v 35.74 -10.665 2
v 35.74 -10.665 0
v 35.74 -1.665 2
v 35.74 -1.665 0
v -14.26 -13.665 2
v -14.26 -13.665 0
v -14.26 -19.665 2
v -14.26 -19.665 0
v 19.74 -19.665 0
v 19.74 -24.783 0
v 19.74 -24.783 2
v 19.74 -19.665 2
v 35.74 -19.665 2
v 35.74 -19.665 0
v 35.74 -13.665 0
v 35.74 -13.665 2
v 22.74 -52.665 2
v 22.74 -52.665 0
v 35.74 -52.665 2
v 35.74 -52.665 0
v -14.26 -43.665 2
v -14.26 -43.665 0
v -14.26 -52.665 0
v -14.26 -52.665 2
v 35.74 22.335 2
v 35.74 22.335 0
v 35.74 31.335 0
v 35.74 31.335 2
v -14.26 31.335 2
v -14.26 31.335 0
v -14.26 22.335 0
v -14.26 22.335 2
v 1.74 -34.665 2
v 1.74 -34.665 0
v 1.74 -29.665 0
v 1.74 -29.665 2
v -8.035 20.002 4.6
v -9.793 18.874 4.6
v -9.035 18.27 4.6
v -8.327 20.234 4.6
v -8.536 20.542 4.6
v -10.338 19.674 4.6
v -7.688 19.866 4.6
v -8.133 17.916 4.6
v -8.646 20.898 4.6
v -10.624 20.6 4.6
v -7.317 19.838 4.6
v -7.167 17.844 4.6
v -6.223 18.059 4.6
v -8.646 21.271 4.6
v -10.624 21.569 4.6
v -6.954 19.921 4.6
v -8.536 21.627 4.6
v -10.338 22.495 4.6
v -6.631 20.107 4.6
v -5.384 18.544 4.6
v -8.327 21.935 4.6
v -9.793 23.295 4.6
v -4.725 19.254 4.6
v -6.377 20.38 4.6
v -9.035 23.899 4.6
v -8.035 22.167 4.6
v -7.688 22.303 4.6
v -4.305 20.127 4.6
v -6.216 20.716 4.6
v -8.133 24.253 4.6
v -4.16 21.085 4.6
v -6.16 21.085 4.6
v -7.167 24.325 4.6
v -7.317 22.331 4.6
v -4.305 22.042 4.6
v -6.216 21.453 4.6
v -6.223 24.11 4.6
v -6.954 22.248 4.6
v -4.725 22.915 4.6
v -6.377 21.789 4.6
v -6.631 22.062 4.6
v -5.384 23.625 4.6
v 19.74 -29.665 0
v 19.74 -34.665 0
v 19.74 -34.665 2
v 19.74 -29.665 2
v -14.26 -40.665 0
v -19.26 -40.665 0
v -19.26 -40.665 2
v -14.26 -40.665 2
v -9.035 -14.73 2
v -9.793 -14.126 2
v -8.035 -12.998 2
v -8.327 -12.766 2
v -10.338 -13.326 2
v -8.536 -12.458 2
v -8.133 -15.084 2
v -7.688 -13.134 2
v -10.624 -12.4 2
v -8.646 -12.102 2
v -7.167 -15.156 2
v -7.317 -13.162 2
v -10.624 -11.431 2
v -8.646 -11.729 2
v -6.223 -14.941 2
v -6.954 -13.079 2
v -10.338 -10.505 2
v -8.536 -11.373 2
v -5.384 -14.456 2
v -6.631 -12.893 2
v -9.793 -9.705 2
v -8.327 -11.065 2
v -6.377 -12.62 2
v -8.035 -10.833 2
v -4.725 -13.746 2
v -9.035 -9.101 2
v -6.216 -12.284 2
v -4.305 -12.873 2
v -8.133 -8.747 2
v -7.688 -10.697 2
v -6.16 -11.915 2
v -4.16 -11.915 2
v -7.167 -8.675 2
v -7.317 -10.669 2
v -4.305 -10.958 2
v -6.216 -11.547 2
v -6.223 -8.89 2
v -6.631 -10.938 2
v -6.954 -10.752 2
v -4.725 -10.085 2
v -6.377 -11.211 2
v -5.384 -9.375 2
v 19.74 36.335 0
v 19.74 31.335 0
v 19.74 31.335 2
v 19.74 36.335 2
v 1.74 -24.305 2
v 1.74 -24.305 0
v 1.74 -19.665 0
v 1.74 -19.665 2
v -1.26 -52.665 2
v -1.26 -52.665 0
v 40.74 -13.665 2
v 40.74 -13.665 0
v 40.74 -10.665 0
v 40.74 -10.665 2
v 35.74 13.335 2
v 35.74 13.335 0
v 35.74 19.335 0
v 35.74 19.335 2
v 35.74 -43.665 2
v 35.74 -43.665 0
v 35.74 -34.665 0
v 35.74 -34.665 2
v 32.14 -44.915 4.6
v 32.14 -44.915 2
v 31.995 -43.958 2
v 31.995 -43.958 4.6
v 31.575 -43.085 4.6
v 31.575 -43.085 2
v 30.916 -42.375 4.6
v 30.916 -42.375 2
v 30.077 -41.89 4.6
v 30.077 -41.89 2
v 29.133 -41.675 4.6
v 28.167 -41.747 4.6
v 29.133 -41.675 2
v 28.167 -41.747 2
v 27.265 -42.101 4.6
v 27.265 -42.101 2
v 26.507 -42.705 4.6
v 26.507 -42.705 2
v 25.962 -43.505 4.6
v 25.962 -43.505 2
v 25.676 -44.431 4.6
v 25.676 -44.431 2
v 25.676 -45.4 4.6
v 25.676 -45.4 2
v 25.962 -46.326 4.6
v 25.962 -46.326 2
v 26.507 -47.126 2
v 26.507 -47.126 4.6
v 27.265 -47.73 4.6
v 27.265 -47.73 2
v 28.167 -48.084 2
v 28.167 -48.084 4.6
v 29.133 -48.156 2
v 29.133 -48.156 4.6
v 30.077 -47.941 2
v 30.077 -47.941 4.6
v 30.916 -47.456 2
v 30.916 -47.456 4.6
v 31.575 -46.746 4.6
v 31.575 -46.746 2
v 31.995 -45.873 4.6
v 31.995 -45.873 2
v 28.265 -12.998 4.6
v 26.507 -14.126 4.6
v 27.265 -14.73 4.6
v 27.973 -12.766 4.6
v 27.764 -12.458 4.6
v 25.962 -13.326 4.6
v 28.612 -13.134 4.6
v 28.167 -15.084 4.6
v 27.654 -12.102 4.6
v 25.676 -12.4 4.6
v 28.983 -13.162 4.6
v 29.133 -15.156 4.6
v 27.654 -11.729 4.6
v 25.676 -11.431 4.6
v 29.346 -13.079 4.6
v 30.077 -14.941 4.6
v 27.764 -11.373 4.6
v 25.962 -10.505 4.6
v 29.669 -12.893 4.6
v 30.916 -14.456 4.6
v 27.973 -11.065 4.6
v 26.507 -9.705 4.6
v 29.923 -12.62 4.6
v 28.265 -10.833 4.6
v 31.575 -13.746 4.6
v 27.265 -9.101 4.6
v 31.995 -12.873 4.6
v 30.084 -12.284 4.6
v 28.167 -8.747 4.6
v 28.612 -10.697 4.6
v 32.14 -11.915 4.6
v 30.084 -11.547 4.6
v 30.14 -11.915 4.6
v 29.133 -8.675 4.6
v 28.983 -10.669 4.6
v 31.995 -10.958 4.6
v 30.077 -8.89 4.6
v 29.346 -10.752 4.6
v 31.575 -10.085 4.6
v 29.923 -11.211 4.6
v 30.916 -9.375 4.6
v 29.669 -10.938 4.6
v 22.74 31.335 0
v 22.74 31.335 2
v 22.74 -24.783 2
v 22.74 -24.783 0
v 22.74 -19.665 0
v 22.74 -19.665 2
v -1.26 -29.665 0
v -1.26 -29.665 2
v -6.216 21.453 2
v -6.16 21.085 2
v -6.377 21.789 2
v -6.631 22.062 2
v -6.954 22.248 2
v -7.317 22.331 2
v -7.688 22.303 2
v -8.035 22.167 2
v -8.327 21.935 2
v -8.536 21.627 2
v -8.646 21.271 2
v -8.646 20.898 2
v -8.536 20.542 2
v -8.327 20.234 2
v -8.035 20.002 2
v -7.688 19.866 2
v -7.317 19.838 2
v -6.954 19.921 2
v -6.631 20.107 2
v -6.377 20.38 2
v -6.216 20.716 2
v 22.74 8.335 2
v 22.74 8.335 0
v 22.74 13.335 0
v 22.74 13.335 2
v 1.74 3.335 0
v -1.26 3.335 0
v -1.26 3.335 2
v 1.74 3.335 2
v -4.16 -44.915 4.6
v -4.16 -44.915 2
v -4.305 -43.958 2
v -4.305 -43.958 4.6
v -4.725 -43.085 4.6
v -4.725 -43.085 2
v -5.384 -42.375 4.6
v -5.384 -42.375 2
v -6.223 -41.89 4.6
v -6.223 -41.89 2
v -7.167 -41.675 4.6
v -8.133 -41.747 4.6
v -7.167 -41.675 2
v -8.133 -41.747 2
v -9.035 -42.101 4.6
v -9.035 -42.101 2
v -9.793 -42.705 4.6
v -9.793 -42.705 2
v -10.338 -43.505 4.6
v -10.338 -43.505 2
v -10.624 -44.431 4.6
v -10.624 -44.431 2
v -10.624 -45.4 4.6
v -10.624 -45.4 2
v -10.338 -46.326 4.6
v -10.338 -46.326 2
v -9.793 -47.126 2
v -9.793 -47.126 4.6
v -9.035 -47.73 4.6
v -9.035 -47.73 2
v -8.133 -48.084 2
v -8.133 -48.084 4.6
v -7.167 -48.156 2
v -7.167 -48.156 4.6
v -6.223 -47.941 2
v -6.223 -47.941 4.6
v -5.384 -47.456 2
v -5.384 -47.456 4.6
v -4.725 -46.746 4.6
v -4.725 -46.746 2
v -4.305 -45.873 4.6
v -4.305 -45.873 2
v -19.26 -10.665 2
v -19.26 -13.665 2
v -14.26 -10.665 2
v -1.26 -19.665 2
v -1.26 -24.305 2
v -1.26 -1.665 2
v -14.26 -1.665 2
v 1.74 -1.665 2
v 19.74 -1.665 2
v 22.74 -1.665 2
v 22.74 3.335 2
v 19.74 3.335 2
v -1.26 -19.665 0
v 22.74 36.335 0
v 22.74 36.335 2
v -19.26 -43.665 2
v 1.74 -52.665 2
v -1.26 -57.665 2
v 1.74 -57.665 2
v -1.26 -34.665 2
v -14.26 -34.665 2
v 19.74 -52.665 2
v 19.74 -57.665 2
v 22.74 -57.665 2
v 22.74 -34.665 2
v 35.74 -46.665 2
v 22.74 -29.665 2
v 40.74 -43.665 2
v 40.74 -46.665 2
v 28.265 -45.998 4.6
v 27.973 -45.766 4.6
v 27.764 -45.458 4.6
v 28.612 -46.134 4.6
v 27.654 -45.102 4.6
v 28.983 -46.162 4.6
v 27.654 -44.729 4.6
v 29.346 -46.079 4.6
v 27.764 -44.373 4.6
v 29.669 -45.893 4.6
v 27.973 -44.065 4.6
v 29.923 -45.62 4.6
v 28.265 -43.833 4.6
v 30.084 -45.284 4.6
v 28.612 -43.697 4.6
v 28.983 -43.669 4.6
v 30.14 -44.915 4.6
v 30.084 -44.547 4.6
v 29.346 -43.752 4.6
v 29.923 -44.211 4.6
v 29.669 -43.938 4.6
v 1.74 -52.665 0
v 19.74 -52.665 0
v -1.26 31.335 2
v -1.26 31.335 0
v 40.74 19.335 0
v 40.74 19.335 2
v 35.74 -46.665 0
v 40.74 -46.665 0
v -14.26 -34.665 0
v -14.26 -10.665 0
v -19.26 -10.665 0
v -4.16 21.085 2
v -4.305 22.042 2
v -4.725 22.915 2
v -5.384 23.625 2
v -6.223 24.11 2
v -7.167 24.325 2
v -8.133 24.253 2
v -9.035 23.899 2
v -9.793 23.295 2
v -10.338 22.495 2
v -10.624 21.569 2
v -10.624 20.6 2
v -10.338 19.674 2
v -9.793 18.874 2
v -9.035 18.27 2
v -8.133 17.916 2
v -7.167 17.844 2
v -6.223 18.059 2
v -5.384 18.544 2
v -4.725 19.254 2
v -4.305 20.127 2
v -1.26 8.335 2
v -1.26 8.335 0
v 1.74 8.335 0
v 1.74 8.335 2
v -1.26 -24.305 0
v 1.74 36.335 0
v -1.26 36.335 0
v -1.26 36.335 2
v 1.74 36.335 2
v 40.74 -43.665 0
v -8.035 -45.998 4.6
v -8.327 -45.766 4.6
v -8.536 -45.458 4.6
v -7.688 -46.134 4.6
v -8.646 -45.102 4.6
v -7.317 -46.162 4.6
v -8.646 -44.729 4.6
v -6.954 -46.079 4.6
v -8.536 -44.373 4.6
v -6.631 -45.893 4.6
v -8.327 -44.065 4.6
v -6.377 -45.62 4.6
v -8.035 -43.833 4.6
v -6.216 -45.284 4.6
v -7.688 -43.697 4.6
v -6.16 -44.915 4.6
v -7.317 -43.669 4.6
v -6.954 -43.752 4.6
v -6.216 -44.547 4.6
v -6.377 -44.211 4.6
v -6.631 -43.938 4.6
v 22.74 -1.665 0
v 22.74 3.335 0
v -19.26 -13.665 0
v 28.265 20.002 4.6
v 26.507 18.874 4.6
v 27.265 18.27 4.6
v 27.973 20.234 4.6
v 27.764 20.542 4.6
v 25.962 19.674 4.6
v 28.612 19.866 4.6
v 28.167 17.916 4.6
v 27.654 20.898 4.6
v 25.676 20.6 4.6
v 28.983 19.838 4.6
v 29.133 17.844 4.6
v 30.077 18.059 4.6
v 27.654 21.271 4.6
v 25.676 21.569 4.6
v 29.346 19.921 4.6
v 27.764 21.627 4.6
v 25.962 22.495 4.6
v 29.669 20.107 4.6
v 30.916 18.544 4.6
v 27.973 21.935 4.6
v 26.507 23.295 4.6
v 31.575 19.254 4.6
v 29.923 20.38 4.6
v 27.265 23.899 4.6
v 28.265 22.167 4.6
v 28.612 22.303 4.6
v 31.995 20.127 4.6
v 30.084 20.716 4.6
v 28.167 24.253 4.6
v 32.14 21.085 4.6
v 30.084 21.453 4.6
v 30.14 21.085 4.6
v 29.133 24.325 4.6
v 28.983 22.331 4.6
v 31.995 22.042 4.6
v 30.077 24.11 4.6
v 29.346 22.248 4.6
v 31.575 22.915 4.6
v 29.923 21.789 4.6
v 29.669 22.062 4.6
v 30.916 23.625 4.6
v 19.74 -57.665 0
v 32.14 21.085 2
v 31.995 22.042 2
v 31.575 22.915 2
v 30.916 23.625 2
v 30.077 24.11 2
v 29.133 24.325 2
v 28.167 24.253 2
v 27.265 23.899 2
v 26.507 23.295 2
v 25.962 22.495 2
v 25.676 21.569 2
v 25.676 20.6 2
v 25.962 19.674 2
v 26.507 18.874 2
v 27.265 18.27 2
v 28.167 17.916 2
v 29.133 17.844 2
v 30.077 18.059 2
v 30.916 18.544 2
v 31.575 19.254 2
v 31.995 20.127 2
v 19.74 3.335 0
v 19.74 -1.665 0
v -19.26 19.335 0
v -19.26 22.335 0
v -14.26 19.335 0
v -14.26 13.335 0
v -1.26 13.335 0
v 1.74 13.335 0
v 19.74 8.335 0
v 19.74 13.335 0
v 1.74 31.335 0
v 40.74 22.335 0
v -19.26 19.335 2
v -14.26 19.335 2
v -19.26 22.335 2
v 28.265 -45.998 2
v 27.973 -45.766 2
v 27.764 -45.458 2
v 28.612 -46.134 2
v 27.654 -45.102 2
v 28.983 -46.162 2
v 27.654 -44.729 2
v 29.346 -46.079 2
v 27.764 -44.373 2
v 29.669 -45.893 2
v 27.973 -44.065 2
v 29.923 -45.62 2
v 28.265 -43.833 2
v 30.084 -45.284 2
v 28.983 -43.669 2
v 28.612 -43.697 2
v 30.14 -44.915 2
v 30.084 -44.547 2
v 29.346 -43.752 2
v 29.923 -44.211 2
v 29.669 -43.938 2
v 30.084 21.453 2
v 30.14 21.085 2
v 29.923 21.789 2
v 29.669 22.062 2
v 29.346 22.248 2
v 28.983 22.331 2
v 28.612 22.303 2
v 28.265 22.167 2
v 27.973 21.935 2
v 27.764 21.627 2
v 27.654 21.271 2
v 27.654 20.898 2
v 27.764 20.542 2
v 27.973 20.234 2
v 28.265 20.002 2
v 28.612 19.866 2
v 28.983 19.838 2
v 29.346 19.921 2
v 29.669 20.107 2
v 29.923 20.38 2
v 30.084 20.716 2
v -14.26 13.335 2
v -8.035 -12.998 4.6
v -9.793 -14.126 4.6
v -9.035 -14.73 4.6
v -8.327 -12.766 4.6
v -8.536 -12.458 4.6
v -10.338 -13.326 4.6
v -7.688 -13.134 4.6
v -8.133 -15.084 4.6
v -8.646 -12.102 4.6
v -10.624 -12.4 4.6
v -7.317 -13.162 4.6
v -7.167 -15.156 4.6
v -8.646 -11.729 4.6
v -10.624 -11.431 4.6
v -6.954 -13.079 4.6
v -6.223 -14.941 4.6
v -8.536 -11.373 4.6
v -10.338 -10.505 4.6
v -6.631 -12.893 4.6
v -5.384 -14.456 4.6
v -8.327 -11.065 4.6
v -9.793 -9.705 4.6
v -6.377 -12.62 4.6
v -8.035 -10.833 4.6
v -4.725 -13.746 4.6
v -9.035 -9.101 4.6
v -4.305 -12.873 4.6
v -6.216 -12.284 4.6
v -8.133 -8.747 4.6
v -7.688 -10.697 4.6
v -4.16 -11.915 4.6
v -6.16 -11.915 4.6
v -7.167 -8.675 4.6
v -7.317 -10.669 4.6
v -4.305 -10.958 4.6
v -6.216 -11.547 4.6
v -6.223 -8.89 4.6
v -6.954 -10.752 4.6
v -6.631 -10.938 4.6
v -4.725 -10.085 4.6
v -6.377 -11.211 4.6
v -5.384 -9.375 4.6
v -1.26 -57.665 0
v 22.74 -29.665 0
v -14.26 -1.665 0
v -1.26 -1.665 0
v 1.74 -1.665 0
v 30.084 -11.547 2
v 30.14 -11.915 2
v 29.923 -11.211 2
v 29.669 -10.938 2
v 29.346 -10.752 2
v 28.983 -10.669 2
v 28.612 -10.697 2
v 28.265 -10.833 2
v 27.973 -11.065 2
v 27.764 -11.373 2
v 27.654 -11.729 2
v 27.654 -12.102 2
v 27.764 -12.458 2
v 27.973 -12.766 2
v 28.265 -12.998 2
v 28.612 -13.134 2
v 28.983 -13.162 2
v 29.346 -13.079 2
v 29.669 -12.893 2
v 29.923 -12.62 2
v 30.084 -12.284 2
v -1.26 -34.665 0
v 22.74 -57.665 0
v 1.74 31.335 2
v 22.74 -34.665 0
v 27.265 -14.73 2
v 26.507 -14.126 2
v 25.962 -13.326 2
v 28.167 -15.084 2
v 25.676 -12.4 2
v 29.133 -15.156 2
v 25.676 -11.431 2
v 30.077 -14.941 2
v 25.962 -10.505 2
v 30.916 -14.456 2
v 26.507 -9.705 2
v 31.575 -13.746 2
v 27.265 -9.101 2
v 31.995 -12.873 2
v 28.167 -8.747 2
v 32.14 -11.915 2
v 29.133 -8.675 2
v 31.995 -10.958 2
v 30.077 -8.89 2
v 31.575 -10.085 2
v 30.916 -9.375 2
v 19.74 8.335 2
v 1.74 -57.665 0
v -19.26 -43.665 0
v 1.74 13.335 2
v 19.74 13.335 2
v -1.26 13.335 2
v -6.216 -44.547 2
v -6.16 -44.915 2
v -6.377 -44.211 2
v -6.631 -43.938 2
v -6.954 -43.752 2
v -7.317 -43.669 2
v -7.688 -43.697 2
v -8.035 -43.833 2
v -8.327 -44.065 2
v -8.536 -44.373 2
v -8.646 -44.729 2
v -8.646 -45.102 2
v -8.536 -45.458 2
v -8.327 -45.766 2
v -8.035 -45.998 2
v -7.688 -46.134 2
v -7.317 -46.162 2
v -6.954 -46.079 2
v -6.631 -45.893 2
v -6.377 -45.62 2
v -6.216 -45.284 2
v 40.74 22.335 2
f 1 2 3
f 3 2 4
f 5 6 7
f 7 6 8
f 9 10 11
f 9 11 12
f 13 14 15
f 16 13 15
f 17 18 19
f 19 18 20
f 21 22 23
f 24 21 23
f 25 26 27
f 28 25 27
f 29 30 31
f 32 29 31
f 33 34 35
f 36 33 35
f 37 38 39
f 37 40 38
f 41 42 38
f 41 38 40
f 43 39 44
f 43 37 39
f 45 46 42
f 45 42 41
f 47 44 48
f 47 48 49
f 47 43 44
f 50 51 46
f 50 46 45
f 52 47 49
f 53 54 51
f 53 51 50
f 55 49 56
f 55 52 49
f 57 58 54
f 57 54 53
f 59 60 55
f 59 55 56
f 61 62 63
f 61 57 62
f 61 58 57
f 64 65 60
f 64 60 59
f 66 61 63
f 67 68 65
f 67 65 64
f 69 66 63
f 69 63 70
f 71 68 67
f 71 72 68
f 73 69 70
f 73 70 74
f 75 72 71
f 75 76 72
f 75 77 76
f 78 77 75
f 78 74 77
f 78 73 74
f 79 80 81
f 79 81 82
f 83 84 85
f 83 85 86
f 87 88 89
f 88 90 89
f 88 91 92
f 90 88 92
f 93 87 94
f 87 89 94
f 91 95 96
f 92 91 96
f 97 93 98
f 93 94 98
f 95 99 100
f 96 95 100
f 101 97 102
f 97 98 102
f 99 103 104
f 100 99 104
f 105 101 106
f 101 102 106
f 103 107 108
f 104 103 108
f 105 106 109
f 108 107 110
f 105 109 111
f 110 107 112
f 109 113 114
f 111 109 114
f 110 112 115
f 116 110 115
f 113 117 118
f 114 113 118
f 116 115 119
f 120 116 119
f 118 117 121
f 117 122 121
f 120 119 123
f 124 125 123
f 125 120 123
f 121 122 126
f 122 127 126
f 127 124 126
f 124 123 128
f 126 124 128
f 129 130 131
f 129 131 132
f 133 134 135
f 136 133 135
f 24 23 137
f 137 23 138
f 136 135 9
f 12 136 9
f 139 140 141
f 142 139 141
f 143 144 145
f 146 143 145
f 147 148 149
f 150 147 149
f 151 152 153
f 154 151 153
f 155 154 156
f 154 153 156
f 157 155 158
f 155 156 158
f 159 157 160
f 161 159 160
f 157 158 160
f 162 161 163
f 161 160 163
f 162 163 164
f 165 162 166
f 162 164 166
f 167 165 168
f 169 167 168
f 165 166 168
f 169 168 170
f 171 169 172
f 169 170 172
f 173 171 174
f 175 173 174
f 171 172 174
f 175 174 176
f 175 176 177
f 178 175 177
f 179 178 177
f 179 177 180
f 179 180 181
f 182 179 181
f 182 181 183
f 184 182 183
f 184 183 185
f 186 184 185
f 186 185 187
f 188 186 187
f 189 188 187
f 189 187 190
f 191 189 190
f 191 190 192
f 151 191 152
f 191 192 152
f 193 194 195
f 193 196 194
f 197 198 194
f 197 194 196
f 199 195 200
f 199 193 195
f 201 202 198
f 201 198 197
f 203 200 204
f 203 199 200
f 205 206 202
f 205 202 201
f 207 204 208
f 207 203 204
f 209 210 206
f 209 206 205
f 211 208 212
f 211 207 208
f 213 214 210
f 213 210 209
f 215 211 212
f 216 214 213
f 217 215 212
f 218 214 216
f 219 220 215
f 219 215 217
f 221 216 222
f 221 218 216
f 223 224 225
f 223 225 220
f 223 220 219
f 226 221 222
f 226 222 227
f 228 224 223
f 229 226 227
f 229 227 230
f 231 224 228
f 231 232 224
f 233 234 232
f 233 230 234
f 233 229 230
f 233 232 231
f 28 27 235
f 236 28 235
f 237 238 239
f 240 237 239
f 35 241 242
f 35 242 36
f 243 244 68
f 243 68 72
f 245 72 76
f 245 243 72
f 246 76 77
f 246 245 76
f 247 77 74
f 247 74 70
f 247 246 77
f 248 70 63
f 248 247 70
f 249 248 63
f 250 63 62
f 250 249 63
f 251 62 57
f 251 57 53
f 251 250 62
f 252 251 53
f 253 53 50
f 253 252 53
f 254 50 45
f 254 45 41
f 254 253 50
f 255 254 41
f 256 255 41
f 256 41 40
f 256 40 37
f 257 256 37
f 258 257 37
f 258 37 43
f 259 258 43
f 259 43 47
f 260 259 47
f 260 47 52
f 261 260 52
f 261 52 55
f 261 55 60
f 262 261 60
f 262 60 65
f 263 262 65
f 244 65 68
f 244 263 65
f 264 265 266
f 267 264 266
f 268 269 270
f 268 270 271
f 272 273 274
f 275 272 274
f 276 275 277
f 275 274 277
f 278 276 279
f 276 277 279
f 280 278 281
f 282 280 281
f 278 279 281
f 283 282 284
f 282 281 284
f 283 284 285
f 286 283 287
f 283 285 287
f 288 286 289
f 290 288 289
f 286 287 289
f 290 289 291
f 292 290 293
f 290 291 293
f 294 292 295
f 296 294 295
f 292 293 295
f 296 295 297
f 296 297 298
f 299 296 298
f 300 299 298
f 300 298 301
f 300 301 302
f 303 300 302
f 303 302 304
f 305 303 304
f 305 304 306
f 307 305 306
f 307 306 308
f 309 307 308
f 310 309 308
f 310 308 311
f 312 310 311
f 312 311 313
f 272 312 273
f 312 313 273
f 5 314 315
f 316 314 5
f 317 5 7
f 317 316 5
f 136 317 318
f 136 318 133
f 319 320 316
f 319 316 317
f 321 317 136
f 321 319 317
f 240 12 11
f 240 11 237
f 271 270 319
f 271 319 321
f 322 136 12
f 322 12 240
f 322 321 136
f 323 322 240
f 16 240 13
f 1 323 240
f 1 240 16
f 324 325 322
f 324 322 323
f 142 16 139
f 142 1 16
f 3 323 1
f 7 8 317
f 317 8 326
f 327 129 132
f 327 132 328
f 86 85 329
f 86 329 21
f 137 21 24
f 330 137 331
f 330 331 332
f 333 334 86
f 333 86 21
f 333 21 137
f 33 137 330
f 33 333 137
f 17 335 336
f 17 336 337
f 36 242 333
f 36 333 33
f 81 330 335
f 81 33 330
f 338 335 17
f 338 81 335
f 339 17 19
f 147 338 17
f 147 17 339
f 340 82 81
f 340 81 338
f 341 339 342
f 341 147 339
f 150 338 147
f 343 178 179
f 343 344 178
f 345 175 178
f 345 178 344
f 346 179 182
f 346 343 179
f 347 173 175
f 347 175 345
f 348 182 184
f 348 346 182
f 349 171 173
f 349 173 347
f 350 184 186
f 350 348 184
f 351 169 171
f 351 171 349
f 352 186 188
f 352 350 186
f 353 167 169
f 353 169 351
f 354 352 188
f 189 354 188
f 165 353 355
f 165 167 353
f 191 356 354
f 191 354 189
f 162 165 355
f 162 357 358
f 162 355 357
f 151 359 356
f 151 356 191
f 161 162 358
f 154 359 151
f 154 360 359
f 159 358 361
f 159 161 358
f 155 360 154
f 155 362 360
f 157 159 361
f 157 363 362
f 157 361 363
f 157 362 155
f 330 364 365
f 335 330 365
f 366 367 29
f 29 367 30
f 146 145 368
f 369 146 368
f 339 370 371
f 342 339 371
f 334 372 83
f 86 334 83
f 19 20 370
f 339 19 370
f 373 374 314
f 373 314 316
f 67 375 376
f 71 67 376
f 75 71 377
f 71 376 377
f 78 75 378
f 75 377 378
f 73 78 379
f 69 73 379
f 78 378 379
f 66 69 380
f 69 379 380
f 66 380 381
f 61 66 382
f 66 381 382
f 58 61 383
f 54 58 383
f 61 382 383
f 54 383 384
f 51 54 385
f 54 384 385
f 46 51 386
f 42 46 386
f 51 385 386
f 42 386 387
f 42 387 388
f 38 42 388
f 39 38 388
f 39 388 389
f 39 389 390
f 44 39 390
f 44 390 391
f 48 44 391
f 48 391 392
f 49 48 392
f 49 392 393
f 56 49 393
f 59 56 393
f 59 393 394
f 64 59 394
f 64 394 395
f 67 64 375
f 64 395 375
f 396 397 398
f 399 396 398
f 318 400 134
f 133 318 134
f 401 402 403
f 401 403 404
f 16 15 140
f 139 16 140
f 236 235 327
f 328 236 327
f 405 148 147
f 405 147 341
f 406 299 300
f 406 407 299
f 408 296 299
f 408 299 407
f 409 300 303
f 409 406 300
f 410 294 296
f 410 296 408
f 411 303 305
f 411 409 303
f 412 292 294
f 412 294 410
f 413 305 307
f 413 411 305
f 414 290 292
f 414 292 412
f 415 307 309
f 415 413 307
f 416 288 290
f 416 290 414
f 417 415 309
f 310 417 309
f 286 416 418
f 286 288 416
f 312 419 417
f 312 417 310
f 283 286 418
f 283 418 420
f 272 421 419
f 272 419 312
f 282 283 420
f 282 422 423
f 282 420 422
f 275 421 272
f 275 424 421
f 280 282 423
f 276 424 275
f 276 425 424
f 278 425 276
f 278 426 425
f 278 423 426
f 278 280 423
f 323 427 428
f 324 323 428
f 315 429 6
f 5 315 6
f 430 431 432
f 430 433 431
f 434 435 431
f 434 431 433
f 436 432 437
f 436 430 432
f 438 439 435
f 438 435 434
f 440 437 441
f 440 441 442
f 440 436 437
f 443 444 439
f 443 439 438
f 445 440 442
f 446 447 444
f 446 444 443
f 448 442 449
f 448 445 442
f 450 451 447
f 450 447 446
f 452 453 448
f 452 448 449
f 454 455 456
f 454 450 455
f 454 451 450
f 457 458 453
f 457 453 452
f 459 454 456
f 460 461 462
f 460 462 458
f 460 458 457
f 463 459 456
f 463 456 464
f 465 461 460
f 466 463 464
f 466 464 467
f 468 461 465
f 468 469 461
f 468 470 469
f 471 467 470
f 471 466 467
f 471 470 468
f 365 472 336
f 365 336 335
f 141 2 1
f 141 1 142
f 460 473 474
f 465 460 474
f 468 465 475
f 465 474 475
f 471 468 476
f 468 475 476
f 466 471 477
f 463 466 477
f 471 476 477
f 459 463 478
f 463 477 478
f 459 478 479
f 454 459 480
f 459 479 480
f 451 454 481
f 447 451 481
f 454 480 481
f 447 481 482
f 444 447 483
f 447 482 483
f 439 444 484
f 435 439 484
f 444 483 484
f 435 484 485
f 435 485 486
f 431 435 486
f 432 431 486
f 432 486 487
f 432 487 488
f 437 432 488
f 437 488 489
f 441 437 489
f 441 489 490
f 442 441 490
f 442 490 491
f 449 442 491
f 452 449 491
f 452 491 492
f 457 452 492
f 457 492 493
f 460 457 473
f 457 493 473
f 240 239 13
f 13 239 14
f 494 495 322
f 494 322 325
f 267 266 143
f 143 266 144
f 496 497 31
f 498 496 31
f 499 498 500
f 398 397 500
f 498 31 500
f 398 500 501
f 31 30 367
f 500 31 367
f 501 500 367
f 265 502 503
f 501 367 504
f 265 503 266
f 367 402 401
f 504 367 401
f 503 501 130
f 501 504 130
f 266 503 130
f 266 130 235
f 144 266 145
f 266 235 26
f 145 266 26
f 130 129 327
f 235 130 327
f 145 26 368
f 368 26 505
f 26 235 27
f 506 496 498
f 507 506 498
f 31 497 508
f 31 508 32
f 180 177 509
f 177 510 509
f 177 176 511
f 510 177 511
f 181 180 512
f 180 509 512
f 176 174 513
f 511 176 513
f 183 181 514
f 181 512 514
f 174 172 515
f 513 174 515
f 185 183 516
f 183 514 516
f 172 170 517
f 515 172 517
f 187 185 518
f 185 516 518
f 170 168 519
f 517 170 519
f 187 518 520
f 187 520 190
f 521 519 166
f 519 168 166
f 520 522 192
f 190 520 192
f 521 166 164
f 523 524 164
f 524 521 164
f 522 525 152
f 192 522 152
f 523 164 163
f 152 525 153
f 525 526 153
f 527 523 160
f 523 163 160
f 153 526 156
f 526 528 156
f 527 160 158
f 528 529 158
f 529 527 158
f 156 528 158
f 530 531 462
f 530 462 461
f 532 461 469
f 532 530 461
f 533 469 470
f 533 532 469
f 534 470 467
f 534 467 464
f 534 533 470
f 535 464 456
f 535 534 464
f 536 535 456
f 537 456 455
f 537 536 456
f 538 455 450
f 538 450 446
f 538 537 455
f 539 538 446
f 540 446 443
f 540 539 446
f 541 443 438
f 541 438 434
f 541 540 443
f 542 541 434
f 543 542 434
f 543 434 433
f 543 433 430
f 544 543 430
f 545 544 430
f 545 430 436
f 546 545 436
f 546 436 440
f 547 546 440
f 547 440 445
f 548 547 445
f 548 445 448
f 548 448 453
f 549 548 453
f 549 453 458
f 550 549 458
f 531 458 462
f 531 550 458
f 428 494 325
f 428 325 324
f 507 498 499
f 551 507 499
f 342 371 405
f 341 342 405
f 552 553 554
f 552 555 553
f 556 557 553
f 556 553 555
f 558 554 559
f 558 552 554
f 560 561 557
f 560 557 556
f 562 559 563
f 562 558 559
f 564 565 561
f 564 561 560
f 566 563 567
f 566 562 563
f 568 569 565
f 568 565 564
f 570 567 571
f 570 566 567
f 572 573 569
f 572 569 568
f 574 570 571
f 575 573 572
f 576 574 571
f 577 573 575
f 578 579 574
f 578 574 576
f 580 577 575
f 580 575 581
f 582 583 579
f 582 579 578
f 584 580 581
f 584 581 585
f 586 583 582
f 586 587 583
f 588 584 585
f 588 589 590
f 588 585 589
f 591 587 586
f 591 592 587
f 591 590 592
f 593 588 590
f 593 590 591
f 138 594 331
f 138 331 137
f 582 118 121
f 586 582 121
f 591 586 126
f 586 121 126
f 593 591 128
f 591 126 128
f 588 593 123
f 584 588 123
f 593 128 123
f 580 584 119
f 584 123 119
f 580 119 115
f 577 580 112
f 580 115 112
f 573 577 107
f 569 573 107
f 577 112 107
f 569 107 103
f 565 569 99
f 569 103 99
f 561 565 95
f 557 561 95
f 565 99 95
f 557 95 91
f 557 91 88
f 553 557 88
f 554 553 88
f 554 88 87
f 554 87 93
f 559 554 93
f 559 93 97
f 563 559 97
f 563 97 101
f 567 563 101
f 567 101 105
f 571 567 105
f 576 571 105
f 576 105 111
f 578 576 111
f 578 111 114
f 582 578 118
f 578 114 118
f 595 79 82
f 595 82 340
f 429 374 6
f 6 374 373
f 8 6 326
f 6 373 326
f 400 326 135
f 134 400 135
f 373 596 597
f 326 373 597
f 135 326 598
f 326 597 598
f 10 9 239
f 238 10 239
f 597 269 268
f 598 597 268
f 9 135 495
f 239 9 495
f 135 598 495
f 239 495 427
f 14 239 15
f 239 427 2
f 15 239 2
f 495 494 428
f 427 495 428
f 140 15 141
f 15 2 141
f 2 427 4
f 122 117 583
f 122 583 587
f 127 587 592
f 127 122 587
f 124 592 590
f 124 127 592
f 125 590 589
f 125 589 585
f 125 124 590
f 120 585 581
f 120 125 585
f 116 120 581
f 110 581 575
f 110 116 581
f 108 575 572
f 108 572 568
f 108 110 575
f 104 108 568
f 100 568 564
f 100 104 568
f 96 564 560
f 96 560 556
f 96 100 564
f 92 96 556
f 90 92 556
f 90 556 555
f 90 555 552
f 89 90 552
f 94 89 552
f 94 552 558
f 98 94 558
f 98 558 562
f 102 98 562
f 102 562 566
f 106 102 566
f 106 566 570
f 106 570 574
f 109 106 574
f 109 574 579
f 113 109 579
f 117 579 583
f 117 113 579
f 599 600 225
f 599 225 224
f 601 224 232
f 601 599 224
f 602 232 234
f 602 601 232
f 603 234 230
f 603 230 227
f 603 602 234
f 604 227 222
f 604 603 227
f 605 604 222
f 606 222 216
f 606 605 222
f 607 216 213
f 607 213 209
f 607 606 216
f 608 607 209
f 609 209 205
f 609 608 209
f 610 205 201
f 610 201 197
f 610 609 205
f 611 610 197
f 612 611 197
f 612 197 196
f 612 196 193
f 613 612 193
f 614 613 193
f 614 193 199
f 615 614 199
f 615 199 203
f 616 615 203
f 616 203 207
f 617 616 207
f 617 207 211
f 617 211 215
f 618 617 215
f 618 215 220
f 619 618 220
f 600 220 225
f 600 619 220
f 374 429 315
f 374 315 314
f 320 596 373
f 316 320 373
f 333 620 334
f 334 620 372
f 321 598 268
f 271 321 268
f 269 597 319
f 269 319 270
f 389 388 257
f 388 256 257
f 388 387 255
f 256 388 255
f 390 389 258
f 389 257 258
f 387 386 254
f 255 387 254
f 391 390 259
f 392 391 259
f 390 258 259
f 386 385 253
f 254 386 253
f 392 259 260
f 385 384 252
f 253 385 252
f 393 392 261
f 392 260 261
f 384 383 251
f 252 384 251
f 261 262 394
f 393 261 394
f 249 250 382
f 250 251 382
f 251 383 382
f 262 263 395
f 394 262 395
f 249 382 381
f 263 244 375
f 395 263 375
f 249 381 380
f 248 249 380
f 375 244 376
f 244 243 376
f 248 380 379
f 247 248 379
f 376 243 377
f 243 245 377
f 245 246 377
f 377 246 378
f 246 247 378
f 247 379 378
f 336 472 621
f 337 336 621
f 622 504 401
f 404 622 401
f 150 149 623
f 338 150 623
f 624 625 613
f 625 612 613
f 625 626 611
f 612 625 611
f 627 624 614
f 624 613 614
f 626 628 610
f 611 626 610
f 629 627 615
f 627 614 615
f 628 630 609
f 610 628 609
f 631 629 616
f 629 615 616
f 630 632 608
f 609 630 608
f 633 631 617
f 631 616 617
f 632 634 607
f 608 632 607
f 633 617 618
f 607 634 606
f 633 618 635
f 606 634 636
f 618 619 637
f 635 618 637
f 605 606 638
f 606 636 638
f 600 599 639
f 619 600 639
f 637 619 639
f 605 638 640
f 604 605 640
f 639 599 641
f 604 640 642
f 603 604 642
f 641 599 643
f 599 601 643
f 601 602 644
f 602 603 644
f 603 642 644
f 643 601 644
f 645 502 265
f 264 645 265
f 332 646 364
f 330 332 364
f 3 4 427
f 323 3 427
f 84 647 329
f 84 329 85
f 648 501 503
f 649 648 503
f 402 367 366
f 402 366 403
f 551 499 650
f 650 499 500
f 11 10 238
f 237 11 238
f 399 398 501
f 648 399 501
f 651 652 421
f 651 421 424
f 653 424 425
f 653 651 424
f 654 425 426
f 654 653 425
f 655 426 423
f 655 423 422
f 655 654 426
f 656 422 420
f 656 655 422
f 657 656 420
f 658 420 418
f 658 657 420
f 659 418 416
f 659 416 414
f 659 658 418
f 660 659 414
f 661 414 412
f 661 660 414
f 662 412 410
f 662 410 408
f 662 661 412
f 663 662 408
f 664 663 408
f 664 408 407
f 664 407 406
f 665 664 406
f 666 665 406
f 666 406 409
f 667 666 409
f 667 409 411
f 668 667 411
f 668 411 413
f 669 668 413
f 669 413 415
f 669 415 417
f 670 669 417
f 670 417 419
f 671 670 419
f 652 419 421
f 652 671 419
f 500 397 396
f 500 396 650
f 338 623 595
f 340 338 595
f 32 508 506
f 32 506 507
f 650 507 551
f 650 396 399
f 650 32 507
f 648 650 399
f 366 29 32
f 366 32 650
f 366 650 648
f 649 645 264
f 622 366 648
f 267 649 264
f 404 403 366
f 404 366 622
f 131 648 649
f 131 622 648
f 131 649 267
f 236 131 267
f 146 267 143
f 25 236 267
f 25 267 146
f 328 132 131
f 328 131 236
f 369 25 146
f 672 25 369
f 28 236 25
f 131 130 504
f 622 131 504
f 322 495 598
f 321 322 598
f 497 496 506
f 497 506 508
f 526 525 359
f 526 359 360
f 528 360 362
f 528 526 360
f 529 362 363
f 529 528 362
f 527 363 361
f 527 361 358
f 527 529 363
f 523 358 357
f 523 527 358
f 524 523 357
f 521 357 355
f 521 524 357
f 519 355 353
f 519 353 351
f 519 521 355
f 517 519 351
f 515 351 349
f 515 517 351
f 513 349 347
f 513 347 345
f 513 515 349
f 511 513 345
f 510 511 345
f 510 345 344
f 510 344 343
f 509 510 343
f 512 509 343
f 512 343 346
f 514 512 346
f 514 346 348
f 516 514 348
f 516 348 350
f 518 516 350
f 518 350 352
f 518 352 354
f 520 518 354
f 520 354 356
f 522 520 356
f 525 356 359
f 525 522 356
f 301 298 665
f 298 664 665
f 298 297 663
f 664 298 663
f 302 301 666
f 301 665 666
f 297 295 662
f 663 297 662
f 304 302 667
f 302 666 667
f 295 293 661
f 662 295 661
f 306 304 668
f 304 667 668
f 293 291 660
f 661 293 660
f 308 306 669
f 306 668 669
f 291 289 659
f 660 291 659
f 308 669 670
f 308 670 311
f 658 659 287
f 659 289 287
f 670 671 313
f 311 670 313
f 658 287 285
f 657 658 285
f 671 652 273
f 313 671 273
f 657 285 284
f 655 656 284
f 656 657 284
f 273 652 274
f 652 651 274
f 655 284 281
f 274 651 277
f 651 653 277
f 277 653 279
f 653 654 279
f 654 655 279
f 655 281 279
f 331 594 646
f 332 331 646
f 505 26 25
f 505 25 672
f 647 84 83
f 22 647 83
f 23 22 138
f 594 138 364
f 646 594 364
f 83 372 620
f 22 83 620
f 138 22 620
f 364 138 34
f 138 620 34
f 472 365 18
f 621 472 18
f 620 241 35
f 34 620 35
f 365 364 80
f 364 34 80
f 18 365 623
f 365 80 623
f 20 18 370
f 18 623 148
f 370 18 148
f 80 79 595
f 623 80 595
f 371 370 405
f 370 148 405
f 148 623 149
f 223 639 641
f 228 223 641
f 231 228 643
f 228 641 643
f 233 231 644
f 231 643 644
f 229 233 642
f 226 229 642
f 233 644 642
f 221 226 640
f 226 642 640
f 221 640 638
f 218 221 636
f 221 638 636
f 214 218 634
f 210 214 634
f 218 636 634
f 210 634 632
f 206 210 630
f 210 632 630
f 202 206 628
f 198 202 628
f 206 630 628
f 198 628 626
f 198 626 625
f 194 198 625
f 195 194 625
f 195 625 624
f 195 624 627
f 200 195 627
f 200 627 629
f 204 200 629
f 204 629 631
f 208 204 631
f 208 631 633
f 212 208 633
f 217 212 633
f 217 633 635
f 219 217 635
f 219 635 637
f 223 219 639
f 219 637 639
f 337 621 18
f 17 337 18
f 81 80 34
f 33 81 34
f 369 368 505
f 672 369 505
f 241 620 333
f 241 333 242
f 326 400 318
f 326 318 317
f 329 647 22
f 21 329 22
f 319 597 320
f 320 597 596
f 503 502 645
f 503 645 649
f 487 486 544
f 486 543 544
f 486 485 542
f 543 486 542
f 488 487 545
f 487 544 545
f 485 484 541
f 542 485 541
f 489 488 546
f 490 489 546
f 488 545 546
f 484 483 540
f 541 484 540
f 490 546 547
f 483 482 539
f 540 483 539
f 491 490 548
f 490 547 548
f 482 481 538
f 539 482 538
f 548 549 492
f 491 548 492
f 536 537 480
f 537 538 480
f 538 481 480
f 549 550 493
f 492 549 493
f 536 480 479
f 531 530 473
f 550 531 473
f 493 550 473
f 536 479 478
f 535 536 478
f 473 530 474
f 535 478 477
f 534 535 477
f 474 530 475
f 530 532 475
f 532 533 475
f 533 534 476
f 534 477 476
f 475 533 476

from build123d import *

# Parameters (mm, degrees)
F0_W     = 3
F0_H     = 5
F0_W_2   = 5
F0_H_2   = 3
F0_H_3   = 4.639511
F0_H_4   = 5.117211
F1_DEPTH = 2
F2_R     = 3.25
F2_R_2   = 1.25
F3_DEPTH = 2.6


with BuildPart() as f1:
    # F0 (on Top) → F1 (new body)
    with BuildSketch(Plane.XY):
        Polygon((-1.260213, 31.334544), (-14.260213, 31.334544), (-14.260213, 22.334544), (-14.260213, 19.334544), (-14.260213, 13.334544), (-1.260213, 13.334544), (1.739787, 13.334544), (19.739787, 13.334544), (22.739787, 13.334544), (35.739787, 13.334544), (35.739787, 19.334544), (35.739787, 22.334544), (35.739787, 31.334544), (22.739787, 31.334544), (19.739787, 31.334544), (1.739787, 31.334544), align=None)
        with Locations((0.239787, 33.834544)):
            Rectangle(F0_W, F0_H)
        with Locations((-16.760213, 20.834544)):
            Rectangle(F0_W_2, F0_H_2)
        with Locations((21.239787, 33.834544)):
            Rectangle(F0_W, F0_H)
        with Locations((0.239787, 10.834544)):
            Rectangle(F0_W, F0_H)
        with Locations((38.239787, 20.834544)):
            Rectangle(F0_W_2, F0_H_2)
        with Locations((21.239787, 10.834544)):
            Rectangle(F0_W, F0_H)
        Polygon((-1.260213, -1.665456), (-14.260213, -1.665456), (-14.260213, -10.665456), (-14.260213, -13.665456), (-14.260213, -19.665456), (-1.260213, -19.665456), (1.739787, -19.665456), (19.739787, -19.665456), (22.739787, -19.665456), (35.739787, -19.665456), (35.739787, -13.665456), (35.739787, -10.665456), (35.739787, -1.665456), (22.739787, -1.665456), (19.739787, -1.665456), (1.739787, -1.665456), align=None)
        with Locations((0.239787, 0.834544)):
            Rectangle(F0_W, F0_H)
        with Locations((-16.760213, -12.165456)):
            Rectangle(F0_W_2, F0_H_2)
        with Locations((21.239787, 0.834544)):
            Rectangle(F0_W, F0_H)
        with Locations((0.239787, -21.985211)):
            Rectangle(F0_W, F0_H_3)
        with Locations((38.239787, -12.165456)):
            Rectangle(F0_W_2, F0_H_2)
        with Locations((21.239787, -22.224061)):
            Rectangle(F0_W, F0_H_4)
        Polygon((-1.260213, -34.665456), (-14.260213, -34.665456), (-14.260213, -40.665456), (-14.260213, -43.665456), (-14.260213, -52.665456), (-1.260213, -52.665456), (1.739787, -52.665456), (19.739787, -52.665456), (22.739787, -52.665456), (35.739787, -52.665456), (35.739787, -46.665456), (35.739787, -43.665456), (35.739787, -34.665456), (22.739787, -34.665456), (19.739787, -34.665456), (1.739787, -34.665456), align=None)
        with Locations((0.239787, -32.165456)):
            Rectangle(F0_W, F0_H)
        with Locations((-16.760213, -42.165456)):
            Rectangle(F0_W_2, F0_H_2)
        with Locations((21.239787, -32.165456)):
            Rectangle(F0_W, F0_H)
        with Locations((0.239787, -55.165456)):
            Rectangle(F0_W, F0_H)
        with Locations((38.239787, -45.165456)):
            Rectangle(F0_W_2, F0_H_2)
        with Locations((21.239787, -55.165456)):
            Rectangle(F0_W, F0_H)
    extrude(amount=F1_DEPTH)


with BuildPart() as f3:
    # F2 (on face) → F3 (new body)
    with BuildSketch(Plane.XY.offset(2)):
        with Locations((-7.410213, 21.084544)):
            Circle(F2_R)
        with Locations((-7.410213, 21.084544)):
            Circle(F2_R_2, mode=Mode.SUBTRACT)
        with Locations((28.889787, 21.084544)):
            Circle(F2_R)
        with Locations((28.889787, 21.084544)):
            Circle(F2_R_2, mode=Mode.SUBTRACT)
        with Locations((-7.410213, -11.915456)):
            Circle(F2_R)
        with Locations((-7.410213, -11.915456)):
            Circle(F2_R_2, mode=Mode.SUBTRACT)
        with Locations((-7.410213, -44.915456)):
            Circle(F2_R)
        with Locations((-7.410213, -44.915456)):
            Circle(F2_R_2, mode=Mode.SUBTRACT)
        with Locations((28.889787, -11.915456)):
            Circle(F2_R)
        with Locations((28.889787, -11.915456)):
            Circle(F2_R_2, mode=Mode.SUBTRACT)
        with Locations((28.889787, -44.915456)):
            Circle(F2_R)
        with Locations((28.889787, -44.915456)):
            Circle(F2_R_2, mode=Mode.SUBTRACT)
    extrude(amount=F3_DEPTH)


solid = Compound([f1.part, f3.part])
